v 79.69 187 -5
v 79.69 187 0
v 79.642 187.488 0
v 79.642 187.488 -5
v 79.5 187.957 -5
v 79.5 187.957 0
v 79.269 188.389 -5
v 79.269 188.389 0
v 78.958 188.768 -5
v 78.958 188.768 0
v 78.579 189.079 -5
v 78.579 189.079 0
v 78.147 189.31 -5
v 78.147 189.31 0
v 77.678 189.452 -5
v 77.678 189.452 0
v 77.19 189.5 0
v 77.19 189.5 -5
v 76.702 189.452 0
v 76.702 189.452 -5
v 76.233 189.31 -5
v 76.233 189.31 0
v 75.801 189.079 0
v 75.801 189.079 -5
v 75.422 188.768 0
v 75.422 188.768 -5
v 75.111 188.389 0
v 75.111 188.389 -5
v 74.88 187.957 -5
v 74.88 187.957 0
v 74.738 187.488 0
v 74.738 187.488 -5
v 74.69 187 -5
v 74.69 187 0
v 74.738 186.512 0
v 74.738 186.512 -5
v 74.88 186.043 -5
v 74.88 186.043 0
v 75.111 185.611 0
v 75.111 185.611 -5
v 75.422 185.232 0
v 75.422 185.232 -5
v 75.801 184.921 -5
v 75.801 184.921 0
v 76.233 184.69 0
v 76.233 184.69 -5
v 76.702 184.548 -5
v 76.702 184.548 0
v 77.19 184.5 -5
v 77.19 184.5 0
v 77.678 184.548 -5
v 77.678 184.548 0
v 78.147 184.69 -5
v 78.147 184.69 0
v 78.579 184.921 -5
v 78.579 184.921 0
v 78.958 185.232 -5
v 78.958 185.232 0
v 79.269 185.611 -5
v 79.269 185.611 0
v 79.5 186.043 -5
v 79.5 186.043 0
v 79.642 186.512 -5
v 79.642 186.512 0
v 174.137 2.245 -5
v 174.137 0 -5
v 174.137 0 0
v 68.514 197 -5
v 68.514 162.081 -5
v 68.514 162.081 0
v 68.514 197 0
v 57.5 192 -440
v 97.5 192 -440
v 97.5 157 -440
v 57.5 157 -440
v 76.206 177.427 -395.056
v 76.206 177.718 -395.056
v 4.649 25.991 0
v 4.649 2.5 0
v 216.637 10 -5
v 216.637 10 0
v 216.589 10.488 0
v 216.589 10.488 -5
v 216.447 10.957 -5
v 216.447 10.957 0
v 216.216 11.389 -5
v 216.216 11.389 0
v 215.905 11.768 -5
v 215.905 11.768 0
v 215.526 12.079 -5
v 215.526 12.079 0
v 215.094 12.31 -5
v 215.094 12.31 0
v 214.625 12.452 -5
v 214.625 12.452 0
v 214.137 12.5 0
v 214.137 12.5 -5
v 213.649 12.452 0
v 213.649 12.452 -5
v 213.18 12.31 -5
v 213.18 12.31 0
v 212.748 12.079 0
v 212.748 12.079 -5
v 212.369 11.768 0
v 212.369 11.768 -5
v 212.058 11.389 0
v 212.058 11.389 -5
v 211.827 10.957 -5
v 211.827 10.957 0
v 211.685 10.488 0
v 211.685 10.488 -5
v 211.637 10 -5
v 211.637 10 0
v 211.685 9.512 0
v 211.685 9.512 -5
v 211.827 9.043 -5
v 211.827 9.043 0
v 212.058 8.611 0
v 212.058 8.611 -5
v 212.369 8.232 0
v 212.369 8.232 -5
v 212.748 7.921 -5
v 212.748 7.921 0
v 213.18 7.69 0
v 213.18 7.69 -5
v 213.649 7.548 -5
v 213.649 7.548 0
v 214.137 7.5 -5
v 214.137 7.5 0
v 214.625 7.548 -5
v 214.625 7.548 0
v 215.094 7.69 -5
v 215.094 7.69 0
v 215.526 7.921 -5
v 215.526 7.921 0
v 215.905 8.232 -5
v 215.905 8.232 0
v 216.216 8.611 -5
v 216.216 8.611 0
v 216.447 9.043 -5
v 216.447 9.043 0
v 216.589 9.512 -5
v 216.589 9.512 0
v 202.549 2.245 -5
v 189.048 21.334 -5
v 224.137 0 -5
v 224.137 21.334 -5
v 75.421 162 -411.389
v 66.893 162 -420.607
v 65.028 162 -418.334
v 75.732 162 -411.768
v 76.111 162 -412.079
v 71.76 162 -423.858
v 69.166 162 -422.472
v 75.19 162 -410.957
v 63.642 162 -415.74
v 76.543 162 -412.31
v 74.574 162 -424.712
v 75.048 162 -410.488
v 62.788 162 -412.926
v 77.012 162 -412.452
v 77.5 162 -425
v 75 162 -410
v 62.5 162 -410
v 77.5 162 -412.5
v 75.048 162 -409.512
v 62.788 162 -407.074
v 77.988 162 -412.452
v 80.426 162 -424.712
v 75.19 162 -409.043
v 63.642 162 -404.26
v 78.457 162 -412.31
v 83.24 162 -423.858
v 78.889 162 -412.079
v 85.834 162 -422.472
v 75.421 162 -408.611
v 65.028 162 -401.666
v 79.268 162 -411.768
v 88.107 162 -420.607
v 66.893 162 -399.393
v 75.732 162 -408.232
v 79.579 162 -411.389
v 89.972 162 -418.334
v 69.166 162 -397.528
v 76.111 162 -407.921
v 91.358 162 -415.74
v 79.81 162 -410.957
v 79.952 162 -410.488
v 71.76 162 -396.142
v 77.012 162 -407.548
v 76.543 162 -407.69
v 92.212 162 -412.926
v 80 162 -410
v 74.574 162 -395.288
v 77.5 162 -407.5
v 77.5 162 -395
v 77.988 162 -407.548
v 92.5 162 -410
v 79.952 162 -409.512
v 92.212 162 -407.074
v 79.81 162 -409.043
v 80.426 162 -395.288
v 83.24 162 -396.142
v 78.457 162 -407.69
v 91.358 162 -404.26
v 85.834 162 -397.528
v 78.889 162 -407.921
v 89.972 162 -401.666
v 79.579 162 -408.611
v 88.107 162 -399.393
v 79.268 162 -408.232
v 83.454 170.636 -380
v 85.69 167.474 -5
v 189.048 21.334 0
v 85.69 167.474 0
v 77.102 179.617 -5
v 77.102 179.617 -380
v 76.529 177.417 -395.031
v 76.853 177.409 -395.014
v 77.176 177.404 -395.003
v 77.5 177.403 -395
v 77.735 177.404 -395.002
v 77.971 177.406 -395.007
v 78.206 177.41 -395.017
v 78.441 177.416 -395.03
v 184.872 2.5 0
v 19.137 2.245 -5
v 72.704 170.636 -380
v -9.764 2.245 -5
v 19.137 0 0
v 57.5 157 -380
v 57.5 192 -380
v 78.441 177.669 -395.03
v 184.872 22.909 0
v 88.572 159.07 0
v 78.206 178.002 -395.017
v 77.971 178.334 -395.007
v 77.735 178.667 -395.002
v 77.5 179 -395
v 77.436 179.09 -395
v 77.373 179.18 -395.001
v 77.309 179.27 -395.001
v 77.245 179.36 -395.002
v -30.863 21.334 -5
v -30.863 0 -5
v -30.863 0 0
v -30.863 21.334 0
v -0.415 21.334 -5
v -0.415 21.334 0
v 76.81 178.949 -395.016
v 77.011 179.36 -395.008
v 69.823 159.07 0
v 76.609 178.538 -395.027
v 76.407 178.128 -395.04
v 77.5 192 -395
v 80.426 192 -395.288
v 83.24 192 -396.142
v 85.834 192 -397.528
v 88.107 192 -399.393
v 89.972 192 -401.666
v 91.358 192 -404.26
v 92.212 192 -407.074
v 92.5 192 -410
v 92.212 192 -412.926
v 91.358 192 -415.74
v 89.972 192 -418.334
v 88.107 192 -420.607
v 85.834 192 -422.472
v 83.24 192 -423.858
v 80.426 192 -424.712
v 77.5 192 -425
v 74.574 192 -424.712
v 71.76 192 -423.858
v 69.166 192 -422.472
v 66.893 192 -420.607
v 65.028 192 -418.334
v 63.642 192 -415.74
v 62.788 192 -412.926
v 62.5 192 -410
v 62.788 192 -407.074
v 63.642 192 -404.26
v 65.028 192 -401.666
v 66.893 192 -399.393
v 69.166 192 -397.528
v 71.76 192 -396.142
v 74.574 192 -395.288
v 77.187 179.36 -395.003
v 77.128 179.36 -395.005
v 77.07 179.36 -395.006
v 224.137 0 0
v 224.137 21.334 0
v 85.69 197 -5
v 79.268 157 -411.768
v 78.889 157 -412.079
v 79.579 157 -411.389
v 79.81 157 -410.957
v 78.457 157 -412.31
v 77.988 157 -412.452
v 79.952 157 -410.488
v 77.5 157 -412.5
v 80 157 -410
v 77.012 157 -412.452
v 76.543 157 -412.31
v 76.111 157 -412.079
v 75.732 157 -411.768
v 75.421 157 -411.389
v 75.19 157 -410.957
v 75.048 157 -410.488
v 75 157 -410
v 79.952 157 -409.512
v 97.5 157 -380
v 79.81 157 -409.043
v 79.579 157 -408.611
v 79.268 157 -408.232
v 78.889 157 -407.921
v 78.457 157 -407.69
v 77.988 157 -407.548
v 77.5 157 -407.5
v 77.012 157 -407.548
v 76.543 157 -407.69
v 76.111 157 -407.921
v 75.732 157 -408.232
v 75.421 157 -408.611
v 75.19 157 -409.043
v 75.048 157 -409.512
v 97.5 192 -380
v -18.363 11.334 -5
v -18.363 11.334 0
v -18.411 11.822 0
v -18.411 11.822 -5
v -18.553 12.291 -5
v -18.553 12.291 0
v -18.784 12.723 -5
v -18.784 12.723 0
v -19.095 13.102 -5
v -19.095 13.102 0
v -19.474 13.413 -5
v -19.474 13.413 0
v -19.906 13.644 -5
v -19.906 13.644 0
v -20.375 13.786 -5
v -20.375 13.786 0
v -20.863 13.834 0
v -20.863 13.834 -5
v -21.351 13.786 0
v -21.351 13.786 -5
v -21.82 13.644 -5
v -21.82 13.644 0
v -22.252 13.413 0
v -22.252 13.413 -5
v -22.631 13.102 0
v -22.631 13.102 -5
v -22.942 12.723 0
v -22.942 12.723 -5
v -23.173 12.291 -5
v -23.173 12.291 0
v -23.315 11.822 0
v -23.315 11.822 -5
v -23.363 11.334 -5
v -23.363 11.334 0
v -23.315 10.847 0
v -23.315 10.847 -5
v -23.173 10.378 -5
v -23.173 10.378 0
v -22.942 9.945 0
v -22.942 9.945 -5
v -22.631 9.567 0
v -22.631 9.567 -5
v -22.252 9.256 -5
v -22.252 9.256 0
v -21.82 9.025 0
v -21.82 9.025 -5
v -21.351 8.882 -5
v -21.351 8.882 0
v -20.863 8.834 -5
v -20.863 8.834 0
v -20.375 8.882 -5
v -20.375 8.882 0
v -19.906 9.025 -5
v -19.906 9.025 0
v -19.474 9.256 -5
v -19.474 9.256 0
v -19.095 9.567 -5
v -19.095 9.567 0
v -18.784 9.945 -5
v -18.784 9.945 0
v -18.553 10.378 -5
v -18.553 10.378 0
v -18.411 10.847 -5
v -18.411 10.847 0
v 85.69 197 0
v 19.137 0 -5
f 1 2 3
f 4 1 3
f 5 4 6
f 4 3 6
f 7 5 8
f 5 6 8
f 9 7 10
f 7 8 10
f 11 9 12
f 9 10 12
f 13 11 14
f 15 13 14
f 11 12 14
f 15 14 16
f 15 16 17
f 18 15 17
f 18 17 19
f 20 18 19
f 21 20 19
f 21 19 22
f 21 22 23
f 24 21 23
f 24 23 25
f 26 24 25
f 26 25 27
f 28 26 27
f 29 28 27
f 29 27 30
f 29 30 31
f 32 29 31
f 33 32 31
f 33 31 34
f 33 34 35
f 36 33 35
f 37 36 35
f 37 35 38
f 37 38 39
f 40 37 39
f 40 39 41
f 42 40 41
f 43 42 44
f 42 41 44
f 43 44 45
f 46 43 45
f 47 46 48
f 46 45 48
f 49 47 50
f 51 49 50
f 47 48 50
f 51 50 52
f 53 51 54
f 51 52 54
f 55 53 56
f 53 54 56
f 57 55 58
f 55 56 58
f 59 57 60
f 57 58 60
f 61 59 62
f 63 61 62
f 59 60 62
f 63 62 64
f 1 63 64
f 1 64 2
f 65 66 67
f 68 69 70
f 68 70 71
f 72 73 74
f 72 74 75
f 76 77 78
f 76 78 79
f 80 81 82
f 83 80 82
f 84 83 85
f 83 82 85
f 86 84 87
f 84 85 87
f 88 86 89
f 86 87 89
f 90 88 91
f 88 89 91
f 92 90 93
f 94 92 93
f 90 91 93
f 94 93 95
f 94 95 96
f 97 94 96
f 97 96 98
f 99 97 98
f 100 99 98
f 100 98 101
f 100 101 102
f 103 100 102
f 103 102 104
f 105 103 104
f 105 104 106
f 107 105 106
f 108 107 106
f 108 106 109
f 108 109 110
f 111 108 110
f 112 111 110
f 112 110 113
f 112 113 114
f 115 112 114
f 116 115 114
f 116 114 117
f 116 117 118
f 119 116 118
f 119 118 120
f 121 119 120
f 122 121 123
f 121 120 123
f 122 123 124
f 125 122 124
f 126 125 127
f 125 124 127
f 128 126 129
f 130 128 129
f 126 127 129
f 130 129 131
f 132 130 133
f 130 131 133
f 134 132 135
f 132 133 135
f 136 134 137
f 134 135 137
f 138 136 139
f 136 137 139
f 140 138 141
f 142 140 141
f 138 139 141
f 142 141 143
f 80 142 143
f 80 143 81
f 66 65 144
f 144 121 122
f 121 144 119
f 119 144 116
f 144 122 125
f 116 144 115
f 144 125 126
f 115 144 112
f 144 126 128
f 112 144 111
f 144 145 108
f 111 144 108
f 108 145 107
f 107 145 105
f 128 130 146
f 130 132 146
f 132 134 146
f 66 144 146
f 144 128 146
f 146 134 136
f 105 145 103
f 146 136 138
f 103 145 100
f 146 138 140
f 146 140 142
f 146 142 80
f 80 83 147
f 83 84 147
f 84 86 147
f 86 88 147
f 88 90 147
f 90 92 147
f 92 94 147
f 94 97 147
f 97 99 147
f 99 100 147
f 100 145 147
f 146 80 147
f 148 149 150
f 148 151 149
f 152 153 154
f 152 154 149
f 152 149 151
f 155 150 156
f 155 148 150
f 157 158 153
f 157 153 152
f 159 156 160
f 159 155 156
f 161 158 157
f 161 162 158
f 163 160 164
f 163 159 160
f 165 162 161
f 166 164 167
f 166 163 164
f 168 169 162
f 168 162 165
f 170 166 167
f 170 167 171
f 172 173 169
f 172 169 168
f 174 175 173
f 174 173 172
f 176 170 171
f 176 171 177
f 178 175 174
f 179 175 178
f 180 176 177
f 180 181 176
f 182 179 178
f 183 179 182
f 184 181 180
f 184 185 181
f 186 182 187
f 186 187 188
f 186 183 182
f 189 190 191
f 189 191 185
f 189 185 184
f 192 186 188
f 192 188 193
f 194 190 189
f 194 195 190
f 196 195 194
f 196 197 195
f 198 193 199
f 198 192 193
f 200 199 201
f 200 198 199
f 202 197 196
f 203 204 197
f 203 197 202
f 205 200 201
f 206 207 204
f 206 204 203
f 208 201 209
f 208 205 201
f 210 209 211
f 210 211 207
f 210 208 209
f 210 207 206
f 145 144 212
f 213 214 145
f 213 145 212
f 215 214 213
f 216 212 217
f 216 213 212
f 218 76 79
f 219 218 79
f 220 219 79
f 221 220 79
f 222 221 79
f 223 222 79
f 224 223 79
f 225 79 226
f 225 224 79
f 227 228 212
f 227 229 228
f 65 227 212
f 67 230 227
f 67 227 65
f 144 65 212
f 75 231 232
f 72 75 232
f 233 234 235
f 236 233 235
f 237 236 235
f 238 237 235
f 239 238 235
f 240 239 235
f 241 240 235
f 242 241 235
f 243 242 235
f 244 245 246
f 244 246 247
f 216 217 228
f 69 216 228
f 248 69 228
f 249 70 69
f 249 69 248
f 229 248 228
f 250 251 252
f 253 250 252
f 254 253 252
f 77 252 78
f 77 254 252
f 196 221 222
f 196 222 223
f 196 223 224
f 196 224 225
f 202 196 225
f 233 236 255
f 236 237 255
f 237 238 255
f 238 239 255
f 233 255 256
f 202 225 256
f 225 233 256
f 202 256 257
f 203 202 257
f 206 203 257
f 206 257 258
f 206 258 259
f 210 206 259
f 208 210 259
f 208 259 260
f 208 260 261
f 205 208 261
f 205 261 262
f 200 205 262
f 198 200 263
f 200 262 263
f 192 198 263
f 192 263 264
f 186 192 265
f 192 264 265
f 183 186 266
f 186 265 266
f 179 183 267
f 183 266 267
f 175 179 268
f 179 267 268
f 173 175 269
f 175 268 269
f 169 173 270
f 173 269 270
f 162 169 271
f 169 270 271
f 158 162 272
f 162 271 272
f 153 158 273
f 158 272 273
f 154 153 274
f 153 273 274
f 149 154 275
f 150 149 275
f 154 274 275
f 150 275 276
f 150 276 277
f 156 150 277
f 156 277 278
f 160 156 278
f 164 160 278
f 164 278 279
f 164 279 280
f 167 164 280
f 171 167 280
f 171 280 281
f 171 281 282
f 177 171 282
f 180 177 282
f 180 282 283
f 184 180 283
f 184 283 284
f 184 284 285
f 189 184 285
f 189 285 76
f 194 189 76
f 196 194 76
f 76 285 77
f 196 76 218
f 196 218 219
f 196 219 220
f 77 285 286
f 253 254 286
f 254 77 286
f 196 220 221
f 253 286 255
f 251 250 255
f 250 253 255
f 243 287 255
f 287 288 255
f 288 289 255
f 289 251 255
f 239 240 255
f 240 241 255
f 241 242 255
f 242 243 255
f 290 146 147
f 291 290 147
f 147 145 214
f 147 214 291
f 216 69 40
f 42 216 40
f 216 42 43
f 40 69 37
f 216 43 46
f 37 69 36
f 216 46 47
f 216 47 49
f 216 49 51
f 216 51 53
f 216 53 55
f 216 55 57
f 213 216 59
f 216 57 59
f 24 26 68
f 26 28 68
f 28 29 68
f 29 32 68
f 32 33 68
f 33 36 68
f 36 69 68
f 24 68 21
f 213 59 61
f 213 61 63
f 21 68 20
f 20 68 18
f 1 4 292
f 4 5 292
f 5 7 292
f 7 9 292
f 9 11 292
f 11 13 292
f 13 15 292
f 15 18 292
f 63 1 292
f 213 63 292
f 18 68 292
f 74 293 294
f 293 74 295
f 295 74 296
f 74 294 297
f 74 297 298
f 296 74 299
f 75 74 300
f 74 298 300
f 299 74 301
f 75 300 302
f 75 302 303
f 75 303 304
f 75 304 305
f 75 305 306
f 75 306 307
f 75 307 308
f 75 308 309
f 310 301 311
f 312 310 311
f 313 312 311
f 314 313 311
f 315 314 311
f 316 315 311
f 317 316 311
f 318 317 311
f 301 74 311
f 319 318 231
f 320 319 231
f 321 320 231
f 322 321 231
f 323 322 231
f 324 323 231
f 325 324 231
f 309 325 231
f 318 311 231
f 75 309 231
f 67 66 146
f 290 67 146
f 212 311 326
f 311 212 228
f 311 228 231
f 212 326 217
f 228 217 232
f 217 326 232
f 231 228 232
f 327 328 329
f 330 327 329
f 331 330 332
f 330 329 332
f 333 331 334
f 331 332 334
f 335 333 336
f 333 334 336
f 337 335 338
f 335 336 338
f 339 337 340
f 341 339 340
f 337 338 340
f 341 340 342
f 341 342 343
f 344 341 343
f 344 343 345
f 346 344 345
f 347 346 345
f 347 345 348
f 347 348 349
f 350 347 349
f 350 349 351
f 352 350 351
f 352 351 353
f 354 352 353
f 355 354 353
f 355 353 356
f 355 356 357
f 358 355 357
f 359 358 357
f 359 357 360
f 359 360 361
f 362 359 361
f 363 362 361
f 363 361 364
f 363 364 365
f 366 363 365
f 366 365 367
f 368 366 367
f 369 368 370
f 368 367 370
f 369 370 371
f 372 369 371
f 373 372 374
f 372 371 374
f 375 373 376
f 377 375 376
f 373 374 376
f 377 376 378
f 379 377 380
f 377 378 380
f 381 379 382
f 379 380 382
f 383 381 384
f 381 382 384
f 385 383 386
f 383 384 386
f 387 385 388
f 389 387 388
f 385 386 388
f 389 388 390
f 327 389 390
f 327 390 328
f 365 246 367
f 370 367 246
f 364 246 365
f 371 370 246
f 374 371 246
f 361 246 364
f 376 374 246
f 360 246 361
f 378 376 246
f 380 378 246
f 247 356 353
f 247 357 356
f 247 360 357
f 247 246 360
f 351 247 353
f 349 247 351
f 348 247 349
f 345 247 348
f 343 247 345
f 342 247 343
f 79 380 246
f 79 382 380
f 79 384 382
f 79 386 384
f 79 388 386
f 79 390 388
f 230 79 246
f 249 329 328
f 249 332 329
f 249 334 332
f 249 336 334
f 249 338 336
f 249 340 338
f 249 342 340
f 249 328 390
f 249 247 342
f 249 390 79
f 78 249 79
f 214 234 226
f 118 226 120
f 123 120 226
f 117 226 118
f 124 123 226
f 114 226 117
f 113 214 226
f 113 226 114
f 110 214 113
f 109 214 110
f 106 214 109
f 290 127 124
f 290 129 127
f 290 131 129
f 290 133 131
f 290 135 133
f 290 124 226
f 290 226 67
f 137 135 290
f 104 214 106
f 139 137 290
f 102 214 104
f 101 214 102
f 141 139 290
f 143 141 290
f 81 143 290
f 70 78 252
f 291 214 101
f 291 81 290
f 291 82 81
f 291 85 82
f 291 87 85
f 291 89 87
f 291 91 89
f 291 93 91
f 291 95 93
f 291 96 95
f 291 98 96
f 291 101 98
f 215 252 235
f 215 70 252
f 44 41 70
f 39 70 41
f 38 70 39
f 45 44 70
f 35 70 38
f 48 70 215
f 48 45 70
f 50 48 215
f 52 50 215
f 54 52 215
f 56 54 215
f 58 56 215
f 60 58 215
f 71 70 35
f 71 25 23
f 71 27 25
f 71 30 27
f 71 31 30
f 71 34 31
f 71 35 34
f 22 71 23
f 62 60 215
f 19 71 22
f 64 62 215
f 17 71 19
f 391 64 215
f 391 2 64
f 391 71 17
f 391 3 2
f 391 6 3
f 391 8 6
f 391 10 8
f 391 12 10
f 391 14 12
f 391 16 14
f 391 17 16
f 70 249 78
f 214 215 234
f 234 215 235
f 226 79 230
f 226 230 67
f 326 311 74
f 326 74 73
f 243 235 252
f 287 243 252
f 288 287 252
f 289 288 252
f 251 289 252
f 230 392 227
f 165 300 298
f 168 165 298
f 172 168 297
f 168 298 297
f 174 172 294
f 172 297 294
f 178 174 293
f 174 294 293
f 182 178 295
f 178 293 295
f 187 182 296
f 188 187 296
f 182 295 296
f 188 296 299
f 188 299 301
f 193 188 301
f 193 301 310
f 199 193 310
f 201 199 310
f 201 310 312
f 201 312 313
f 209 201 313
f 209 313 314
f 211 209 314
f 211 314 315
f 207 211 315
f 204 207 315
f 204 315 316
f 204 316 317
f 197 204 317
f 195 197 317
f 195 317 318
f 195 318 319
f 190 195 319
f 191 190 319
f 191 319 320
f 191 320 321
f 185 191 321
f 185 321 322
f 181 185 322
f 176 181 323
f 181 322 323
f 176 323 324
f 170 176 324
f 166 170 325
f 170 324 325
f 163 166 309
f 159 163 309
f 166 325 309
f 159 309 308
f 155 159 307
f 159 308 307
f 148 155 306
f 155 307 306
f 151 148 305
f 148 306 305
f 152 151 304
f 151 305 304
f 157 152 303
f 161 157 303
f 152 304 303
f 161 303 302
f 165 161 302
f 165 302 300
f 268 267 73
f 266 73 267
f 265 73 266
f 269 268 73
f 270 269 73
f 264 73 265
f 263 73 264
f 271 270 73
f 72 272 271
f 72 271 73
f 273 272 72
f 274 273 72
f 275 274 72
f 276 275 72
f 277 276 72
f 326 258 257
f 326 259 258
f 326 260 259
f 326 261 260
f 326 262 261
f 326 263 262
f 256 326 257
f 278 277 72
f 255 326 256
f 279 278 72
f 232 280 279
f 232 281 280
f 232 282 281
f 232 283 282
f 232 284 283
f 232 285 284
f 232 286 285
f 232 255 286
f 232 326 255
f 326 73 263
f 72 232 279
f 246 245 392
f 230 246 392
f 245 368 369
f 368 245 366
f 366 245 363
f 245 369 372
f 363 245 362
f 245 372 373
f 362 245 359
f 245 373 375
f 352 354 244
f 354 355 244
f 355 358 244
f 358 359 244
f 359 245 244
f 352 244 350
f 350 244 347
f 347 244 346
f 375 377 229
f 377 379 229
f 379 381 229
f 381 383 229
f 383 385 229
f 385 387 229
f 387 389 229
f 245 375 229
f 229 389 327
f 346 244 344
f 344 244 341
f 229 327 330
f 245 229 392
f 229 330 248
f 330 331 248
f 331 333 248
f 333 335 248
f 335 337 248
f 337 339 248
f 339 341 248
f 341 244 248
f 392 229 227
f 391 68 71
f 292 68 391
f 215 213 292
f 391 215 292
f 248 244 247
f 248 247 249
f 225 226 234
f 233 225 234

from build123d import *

# Parameters (mm, degrees)
ESBO_O7_W                = 40
ESBO_O7_H                = 35
CORTE_EXTRUS_O3_DEPTH    = 20
ESBO_O8_W                = 40
ESBO_O8_H                = 35
RESSALTO_EXTRUS_O1_DEPTH = 60
ESBO_O9_R                = 15
CORTE_EXTRUS_O4_DEPTH    = 30
ESBO_O10_W               = 60
ESBO_O10_H               = 42.668623852
CORTE_EXTRUS_O6_DEPTH    = 5
ESBO_O12_W               = 50
ESBO_O12_H               = 21.334311926
RESSALTO_EXTRUS_O3_DEPTH = 5
ESBO_O13_W               = 60
ESBO_O13_H               = 42.668623852
CORTE_EXTRUS_O8_DEPTH    = 5
ESBO_O14_W               = 50
ESBO_O14_H               = 21.334311926
RESSALTO_EXTRUS_O4_DEPTH = 5
ESBO_O15_W               = 17.17613937
ESBO_O15_H               = 45.233285306
CORTE_EXTRUS_O9_DEPTH    = 5
ESBO_O16_W               = 17.17613937
ESBO_O16_H               = 40
RESSALTO_EXTRUS_O5_DEPTH = 5
ESBO_O17_R               = 2.5
CORTE_EXTRUS_O10_DEPTH   = 10
ESBO_O21_R               = 2.5
CORTE_EXTRUS_O11_DEPTH   = 519.156686831


with BuildPart() as part:
    # Esboço2 → Loft1 section 0
    with BuildSketch(Plane.XY, mode=Mode.PRIVATE) as loft1_s0:
        with BuildLine():
            Line((-10.863095238, 0), (204.136904762, 0))
            Line((204.136904762, 0), (77.102021041, 179.616642653))
            Line((77.102021041, 179.616642653), (-10.863095238, 0))
        make_face()
    loft([Vertex(77.102021041, 179.616642653, -400), loft1_s0.sketch])

    # Esboço7 → Corte-extrusão3 (cut)
    with BuildSketch(Plane(origin=(77.102021041, 179.616642653, -400), x_dir=(1, 0, 0), z_dir=(0, 0, 1))):
        Rectangle(ESBO_O7_W, ESBO_O7_H)
    extrude(amount=CORTE_EXTRUS_O3_DEPTH, mode=Mode.SUBTRACT)

    # Esboço8 → Ressalto-extrusão1 (add)
    with BuildSketch(Plane(origin=(0, 0, -380), x_dir=(-1, 0, 0), z_dir=(0, 0, -1))):
        with Locations((-77.5, 174.5)):
            Rectangle(ESBO_O8_W, ESBO_O8_H)
    extrude(amount=RESSALTO_EXTRUS_O1_DEPTH)

    # Esboço9 → Corte-extrusão4 (cut)
    with BuildSketch(Plane(origin=(0, 192, 0), x_dir=(1, 0, 0), z_dir=(0, 1, 0))):
        with Locations((77.5, 410)):
            Circle(ESBO_O9_R)
    extrude(amount=-CORTE_EXTRUS_O4_DEPTH, mode=Mode.SUBTRACT)

    # Esboço10 → Corte-extrusão6 (cut)
    with BuildSketch(Plane.XY):
        with Locations((-10.863095238, 0)):
            Rectangle(ESBO_O10_W, ESBO_O10_H)
    extrude(amount=-CORTE_EXTRUS_O6_DEPTH, mode=Mode.SUBTRACT)

    # Esboço12 → Ressalto-extrusão3 (add)
    with BuildSketch(Plane.XY.offset(-5)):
        with Locations((-5.863095238, 10.667155963)):
            Rectangle(ESBO_O12_W, ESBO_O12_H)
    extrude(amount=RESSALTO_EXTRUS_O3_DEPTH)

    # Esboço13 → Corte-extrusão8 (cut)
    with BuildSketch(Plane.XY):
        with Locations((204.136904762, 0)):
            Rectangle(ESBO_O13_W, ESBO_O13_H)
    extrude(amount=-CORTE_EXTRUS_O8_DEPTH, mode=Mode.SUBTRACT)

    # Esboço14 → Ressalto-extrusão4 (add)
    with BuildSketch(Plane.XY.offset(-5)):
        with Locations((199.136904762, 10.667155963)):
            Rectangle(ESBO_O14_W, ESBO_O14_H)
    extrude(amount=RESSALTO_EXTRUS_O4_DEPTH)

    # Esboço15 → Corte-extrusão9 (cut)
    with BuildSketch(Plane.XY):
        with Locations((77.102021041, 179.616642653)):
            Rectangle(ESBO_O15_W, ESBO_O15_H)
    extrude(amount=-CORTE_EXTRUS_O9_DEPTH, mode=Mode.SUBTRACT)

    # Esboço16 → Ressalto-extrusão5 (add)
    with BuildSketch(Plane.XY.offset(-5)):
        with Locations((77.102021041, 177)):
            Rectangle(ESBO_O16_W, ESBO_O16_H)
    extrude(amount=RESSALTO_EXTRUS_O5_DEPTH)

    # Esboço17 → Corte-extrusão10 (cut)
    with BuildSketch(Plane.XY):
        with Locations((-20.863095238, 11.334311926)):
            Circle(ESBO_O17_R)
        with Locations((214.136904762, 10)):
            Circle(ESBO_O17_R)
        with Locations((77.190090726, 187)):
            Circle(ESBO_O17_R)
    extrude(amount=-CORTE_EXTRUS_O10_DEPTH, mode=Mode.SUBTRACT)

    # Esboço20 → Loft de corte2 section 0
    with BuildSketch(Plane.XY, mode=Mode.PRIVATE) as loft_de_corte2_s0:
        with BuildLine():
            Line((4.64946483, 2.5), (184.871981239, 2.5))
            Line((184.871981239, 2.5), (184.871981239, 22.909462338))
            Line((184.871981239, 22.909462338), (88.571698608, 159.069963659))
            Line((88.571698608, 159.069963659), (69.823235581, 159.069963659))
            Line((69.823235581, 159.069963659), (4.64946483, 25.99114348))
            Line((4.64946483, 25.99114348), (4.64946483, 2.5))
        make_face()
    loft([loft_de_corte2_s0.sketch, Vertex(77.102021041, 179.616642653, -400)], mode=Mode.SUBTRACT)

    # Esboço21 → Corte-extrusão11 (cut, through all)
    with BuildSketch(Plane.XZ.offset(-157)):
        with Locations((77.5, -410)):
            Circle(ESBO_O21_R)
    extrude(amount=-CORTE_EXTRUS_O11_DEPTH, mode=Mode.SUBTRACT)


solid = part.part
